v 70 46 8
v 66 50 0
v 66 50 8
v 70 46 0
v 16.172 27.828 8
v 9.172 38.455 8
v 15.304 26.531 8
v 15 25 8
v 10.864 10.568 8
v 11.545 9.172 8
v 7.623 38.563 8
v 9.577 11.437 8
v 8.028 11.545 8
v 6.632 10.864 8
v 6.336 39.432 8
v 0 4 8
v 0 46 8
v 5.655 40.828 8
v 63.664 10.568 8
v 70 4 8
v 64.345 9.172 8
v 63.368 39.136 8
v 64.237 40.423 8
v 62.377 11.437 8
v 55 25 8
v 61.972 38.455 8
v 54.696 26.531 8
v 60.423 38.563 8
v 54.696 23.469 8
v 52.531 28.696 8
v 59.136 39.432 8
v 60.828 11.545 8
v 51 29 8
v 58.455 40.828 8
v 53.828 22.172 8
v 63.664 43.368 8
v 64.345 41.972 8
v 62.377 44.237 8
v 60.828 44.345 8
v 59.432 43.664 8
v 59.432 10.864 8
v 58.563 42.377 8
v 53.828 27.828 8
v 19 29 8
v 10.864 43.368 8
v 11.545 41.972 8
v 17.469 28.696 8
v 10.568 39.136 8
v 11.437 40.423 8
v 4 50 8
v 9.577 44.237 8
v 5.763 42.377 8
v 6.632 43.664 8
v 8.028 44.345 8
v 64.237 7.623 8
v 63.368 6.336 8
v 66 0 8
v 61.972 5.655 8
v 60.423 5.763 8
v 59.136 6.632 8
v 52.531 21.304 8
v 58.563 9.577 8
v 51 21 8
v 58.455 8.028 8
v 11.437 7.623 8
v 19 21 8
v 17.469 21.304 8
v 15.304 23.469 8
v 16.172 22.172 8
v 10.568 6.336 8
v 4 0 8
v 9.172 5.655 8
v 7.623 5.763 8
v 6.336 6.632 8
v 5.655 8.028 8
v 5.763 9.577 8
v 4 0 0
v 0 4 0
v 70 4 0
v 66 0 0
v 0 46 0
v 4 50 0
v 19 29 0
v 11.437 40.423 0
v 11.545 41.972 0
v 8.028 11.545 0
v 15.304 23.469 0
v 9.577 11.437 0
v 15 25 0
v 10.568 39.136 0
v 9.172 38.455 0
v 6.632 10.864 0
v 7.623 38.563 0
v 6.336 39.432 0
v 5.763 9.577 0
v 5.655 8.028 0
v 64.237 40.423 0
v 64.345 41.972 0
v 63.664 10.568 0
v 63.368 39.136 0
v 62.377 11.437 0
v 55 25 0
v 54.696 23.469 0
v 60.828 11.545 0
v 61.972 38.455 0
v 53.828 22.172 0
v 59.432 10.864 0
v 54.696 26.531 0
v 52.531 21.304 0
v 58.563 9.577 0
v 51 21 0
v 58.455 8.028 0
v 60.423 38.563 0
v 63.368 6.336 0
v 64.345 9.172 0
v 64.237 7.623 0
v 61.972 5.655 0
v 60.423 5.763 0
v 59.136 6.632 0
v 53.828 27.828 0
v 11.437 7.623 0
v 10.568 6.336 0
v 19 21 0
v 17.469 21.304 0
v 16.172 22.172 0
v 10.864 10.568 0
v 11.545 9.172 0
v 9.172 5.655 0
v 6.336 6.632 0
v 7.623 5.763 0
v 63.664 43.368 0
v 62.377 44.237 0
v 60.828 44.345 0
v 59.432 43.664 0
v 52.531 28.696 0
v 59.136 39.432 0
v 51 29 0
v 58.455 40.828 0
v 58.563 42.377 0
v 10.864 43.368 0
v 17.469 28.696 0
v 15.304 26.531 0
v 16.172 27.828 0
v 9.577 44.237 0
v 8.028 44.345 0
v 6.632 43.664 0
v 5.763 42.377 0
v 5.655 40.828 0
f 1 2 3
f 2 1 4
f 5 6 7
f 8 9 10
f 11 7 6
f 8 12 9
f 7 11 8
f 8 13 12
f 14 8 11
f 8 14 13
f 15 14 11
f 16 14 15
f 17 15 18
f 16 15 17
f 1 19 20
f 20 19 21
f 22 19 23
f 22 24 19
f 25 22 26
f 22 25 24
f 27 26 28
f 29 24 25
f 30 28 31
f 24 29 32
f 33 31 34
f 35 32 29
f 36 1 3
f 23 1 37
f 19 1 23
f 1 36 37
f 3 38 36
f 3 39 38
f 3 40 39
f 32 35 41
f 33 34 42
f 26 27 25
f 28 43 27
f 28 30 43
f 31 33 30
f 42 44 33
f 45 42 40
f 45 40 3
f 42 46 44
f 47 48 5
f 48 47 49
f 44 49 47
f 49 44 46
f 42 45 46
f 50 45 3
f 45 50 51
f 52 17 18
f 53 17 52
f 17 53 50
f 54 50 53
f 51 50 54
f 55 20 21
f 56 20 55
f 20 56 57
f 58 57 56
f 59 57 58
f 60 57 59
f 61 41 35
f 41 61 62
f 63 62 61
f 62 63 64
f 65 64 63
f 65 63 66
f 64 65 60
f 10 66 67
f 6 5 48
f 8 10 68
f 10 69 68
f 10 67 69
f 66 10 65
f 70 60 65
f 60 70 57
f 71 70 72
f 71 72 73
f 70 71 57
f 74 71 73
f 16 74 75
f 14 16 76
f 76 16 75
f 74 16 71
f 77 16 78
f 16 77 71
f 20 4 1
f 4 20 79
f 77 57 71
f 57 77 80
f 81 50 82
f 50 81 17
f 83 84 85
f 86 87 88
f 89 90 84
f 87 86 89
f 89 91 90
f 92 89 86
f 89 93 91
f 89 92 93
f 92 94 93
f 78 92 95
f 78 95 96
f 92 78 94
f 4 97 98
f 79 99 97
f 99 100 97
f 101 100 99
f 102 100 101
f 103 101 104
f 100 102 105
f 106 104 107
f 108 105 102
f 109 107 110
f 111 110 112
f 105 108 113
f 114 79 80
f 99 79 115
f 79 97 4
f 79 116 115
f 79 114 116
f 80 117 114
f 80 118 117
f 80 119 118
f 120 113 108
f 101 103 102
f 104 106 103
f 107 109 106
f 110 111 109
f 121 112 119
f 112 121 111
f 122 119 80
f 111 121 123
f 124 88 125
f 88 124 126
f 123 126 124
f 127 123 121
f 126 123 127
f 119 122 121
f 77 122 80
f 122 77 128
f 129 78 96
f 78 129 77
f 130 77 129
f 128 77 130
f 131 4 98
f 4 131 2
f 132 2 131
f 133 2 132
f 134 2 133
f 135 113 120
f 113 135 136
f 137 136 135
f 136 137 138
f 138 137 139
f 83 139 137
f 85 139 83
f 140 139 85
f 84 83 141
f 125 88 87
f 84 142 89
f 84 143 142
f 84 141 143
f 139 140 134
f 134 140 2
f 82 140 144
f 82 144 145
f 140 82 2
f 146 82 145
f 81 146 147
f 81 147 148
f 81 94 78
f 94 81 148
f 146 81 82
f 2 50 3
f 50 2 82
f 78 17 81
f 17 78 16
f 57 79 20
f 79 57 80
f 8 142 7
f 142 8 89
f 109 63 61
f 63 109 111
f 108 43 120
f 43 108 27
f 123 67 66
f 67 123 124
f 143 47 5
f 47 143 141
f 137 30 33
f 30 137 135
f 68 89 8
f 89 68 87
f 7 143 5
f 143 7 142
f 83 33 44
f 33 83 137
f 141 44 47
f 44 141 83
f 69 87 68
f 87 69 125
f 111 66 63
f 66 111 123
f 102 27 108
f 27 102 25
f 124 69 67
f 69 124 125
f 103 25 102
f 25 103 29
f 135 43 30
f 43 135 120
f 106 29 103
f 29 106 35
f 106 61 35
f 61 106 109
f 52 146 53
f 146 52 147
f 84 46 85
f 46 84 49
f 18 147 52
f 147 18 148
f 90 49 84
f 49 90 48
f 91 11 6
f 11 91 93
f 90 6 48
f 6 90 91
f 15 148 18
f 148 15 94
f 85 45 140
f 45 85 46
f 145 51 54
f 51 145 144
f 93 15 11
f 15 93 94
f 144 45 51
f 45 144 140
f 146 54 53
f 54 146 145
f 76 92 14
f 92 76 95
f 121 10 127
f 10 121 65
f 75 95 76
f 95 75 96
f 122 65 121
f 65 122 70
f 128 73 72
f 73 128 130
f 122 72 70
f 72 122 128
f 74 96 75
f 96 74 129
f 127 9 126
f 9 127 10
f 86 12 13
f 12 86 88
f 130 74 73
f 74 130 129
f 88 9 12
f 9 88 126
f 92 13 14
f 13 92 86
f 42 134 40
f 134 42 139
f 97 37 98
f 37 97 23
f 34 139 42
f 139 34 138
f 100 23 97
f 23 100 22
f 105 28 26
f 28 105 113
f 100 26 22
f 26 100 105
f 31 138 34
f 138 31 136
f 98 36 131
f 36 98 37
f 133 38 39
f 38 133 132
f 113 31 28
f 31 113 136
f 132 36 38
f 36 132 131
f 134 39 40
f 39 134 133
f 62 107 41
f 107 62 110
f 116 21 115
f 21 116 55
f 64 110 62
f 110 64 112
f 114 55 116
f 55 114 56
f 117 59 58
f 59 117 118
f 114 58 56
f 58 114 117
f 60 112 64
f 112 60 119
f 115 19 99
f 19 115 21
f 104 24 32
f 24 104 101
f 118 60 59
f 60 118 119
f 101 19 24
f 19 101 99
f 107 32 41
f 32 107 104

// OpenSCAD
$fn = 32;

// ----------------------------------------------------------------------
// Bracket plate: slot plate 70 x 50
// ----------------------------------------------------------------------

// --- parameters (mm) ---
hole_r = 3;               // bolt hole radius
plate_t = 8;              // plate thickness, Z (extrusion height)
plate_l = 70;             // plate length
plate_w = 50;             // plate width
slot_l = 32;              // slot straight length
slot_r = 4;               // slot end radius

slot_len = slot_l + 2 * slot_r;
slot_w = 2 * slot_r;
hole_d2 = 2 * hole_r;

profile = [[4, 0], [66, 0], [70, 4], [70, 46], [66, 50], [4, 50], [0, 46], [0, 4]];  // primary outline, 8 points, counter clockwise
void_1 = [[51, 21], [52.531, 21.304], [53.828, 22.172], [54.696, 23.469], [55, 25], [54.696, 26.531], [53.828, 27.828], [52.531, 28.696], [51, 29], [19, 29], [17.469, 28.696], [16.172, 27.828], [15.304, 26.531], [15, 25], [15.304, 23.469], [16.172, 22.172], [17.469, 21.304], [19, 21]];  // grip slot, 18 points
void_2 = [[11.545, 41.972], [10.864, 43.368], [9.577, 44.237], [8.028, 44.345], [6.632, 43.664], [5.763, 42.377], [5.655, 40.828], [6.336, 39.432], [7.623, 38.563], [9.172, 38.455], [10.568, 39.136], [11.437, 40.423]];  // corner hole, 12 points
void_3 = [[11.545, 9.172], [10.864, 10.568], [9.577, 11.437], [8.028, 11.545], [6.632, 10.864], [5.763, 9.577], [5.655, 8.028], [6.336, 6.632], [7.623, 5.763], [9.172, 5.655], [10.568, 6.336], [11.437, 7.623]];  // corner hole, 12 points
void_4 = [[64.345, 41.972], [63.664, 43.368], [62.377, 44.237], [60.828, 44.345], [59.432, 43.664], [58.563, 42.377], [58.455, 40.828], [59.136, 39.432], [60.423, 38.563], [61.972, 38.455], [63.368, 39.136], [64.237, 40.423]];  // corner hole, 12 points
void_5 = [[64.345, 9.172], [63.664, 10.568], [62.377, 11.437], [60.828, 11.545], [59.432, 10.864], [58.563, 9.577], [58.455, 8.028], [59.136, 6.632], [60.423, 5.763], [61.972, 5.655], [63.368, 6.336], [64.237, 7.623]];  // corner hole, 12 points

// --- the one profile operation ---
difference() {
  linear_extrude(height = plate_t) polygon(points = profile);
  translate([0, 0, -1])
    linear_extrude(height = plate_t + 2) polygon(points = void_1);
  translate([0, 0, -1])
    linear_extrude(height = plate_t + 2) polygon(points = void_2);
  translate([0, 0, -1])
    linear_extrude(height = plate_t + 2) polygon(points = void_3);
  translate([0, 0, -1])
    linear_extrude(height = plate_t + 2) polygon(points = void_4);
  translate([0, 0, -1])
    linear_extrude(height = plate_t + 2) polygon(points = void_5);
}
